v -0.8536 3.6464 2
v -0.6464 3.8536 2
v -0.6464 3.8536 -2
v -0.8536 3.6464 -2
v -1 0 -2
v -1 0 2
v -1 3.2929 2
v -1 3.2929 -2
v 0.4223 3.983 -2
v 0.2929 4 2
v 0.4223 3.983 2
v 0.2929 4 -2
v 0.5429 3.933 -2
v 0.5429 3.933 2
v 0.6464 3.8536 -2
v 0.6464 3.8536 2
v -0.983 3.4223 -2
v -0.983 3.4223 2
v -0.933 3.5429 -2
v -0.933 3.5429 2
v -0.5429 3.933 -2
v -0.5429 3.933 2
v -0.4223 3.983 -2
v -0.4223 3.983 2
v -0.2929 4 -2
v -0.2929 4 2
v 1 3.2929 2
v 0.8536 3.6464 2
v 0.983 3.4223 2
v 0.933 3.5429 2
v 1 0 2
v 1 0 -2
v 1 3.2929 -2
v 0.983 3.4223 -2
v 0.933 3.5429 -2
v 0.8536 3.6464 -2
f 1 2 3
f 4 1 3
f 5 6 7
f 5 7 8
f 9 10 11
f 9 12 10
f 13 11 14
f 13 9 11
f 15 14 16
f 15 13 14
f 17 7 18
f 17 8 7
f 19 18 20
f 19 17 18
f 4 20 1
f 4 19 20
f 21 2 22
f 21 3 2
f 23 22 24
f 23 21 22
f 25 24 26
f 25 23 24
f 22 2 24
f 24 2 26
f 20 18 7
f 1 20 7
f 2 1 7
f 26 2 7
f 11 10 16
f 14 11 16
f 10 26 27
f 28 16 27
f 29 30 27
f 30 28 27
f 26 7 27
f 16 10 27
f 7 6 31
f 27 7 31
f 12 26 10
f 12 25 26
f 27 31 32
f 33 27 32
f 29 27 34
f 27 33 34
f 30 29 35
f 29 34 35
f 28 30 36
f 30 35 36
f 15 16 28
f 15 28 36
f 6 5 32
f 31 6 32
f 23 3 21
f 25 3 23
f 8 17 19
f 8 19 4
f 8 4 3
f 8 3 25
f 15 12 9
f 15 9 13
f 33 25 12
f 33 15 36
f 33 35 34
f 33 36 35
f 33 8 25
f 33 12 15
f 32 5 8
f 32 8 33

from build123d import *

# Parameters (mm, degrees)
SKETCH1_W           = 2
SKETCH1_H           = 4
BOSS_EXTRUDE1_DEPTH = 4
CHAMFER1_SIZE       = 0.5
FILLET1_R           = 0.5


with BuildPart() as part:
    # Sketch1 → Boss-Extrude1 (new body)
    with BuildSketch(Plane(origin=(0, 0, 0), x_dir=(1, 0, 0), z_dir=(0, 1, 0))):
        Rectangle(SKETCH1_W, SKETCH1_H)
    extrude(amount=BOSS_EXTRUDE1_DEPTH)

    # Chamfer1
    chamfer1_edges = [part.edges().sort_by_distance(p)[0] for p in [
        (-1, 4, 0),
        (1, 4, 0),
    ]]
    chamfer(chamfer1_edges, length=CHAMFER1_SIZE)

    # Fillet1
    fillet1_edges = [part.edges().sort_by_distance(p)[0] for p in [
        (0.5, 4, 0),
        (-0.5, 4, 0),
        (-1, 3.5, 0),
        (1, 3.5, 0),
    ]]
    fillet(fillet1_edges, radius=FILLET1_R)


solid = part.part
